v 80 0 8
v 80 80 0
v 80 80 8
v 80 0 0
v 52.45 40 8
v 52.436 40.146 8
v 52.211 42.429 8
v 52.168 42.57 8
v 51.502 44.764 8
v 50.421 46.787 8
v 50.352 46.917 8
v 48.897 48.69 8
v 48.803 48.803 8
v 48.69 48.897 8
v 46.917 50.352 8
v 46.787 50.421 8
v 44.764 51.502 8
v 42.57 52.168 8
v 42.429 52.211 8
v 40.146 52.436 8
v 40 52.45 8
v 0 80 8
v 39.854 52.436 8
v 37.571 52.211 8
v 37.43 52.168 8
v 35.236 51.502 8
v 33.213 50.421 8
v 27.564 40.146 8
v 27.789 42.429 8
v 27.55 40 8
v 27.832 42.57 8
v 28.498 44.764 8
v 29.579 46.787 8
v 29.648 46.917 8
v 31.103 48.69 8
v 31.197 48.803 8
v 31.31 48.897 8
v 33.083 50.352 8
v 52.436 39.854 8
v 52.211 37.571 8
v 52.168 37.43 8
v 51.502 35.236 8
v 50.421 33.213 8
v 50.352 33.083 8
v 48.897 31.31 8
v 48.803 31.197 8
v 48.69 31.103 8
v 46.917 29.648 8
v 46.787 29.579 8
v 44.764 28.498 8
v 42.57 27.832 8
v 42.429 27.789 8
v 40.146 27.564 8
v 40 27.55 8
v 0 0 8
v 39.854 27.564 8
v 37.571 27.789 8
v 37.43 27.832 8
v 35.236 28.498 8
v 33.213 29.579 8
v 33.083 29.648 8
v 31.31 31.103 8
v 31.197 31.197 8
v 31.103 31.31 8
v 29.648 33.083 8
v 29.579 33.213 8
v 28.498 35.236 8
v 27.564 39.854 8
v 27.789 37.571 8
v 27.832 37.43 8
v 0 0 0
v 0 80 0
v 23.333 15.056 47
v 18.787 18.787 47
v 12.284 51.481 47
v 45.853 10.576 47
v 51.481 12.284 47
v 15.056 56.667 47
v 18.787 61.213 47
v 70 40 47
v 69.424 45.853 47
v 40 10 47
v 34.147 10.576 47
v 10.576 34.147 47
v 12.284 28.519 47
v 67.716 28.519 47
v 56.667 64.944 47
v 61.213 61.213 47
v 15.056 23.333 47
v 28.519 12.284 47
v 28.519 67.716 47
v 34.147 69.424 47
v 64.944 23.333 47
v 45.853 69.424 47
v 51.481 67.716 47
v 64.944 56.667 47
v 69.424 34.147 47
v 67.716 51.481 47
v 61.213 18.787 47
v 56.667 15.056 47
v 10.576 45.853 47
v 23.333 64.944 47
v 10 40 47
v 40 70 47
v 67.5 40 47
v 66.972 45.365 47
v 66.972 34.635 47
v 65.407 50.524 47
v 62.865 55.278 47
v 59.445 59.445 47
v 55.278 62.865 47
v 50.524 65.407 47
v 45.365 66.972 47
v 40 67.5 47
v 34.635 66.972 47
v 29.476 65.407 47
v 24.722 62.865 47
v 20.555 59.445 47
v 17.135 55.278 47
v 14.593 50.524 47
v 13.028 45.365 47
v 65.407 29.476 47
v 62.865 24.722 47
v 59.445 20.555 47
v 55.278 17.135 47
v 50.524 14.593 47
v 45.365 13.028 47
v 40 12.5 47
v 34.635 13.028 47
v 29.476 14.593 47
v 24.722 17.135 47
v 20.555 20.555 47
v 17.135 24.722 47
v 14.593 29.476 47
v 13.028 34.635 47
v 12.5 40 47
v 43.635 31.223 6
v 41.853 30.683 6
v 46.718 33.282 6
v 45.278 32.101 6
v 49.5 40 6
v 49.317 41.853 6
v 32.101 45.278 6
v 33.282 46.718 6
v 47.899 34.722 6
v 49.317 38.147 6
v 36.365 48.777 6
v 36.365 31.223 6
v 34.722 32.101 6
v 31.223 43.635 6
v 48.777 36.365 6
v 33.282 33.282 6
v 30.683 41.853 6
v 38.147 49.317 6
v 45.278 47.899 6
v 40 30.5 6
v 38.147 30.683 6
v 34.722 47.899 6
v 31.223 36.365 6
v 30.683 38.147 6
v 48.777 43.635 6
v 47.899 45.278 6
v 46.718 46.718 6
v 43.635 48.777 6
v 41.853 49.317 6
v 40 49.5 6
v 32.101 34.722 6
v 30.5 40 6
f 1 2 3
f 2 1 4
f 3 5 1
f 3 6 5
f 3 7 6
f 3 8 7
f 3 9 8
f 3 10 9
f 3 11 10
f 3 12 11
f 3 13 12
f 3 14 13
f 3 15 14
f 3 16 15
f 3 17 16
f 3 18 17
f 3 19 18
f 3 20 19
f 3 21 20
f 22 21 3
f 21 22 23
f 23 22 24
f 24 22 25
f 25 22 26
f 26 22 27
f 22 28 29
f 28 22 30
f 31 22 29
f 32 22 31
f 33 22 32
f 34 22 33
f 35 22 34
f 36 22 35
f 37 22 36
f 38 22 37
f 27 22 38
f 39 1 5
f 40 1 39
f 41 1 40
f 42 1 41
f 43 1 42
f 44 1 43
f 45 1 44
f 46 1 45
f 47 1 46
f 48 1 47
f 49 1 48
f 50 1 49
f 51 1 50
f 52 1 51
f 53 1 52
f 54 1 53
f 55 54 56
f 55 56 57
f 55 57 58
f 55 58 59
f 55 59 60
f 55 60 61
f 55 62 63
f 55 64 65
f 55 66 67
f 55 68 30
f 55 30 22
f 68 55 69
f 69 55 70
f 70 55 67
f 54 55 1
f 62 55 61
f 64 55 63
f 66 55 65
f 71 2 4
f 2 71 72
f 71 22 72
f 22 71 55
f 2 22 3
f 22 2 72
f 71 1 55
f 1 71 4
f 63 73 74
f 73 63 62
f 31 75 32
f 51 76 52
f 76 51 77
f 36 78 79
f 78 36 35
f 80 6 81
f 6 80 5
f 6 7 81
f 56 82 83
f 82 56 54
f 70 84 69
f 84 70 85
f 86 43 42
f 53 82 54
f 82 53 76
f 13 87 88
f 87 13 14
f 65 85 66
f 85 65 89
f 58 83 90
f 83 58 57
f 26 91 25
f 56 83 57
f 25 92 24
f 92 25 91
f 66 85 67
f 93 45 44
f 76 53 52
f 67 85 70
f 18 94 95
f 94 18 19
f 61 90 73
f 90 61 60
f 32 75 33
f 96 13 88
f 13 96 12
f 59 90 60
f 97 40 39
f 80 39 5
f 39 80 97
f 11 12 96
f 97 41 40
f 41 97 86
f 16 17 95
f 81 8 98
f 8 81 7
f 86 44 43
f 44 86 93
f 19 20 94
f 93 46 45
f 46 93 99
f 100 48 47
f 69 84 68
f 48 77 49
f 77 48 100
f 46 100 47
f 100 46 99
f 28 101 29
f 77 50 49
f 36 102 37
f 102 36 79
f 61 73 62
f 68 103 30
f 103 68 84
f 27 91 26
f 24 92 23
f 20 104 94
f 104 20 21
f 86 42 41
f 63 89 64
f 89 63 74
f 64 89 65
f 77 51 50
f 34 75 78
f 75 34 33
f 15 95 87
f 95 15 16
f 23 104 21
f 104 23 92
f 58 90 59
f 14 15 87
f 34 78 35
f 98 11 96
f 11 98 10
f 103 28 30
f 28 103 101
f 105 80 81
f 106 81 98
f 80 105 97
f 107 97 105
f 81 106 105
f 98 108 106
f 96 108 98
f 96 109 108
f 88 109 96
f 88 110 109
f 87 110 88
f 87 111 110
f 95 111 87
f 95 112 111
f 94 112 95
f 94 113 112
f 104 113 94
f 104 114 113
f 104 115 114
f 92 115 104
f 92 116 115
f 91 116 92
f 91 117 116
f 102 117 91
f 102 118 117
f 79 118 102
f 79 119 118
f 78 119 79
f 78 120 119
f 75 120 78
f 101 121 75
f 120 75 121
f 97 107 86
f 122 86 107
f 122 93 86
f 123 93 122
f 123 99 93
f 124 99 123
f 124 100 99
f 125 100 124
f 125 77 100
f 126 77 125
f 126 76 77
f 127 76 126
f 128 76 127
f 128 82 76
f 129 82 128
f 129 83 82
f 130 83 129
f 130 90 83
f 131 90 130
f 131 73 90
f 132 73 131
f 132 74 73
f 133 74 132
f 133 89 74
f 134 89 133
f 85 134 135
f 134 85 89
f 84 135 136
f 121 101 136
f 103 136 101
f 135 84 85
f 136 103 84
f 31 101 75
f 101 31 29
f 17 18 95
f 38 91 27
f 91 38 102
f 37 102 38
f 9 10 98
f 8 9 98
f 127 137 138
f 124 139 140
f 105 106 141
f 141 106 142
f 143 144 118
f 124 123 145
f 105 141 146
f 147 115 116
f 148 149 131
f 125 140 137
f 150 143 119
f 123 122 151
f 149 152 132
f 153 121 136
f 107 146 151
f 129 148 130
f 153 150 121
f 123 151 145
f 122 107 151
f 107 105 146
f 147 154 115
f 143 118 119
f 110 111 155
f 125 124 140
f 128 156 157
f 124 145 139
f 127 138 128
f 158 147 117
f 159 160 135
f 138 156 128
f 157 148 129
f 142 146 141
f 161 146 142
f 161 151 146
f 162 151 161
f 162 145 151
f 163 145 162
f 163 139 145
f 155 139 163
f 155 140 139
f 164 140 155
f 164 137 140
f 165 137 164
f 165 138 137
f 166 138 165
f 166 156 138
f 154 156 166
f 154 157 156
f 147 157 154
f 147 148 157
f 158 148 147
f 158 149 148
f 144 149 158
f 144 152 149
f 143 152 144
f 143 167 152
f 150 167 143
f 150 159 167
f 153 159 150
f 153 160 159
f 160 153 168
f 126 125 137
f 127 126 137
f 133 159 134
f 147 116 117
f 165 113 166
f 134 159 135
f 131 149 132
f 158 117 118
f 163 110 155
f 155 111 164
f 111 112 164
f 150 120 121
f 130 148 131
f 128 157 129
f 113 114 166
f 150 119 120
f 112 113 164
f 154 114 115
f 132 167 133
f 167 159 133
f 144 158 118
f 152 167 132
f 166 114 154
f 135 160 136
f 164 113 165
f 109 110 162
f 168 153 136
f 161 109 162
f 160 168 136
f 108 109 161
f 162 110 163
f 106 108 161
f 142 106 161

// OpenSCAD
$fn = 32;

// ----------------------------------------------------------------------
// Hopper: funnel with square flange
// ----------------------------------------------------------------------

// --- parameters (mm) ---
fl = 80;                  // flange side, X and Y
fl_t = 8;                 // flange thickness
cone_h = 40;              // cone height above the flange
top_d = 60;               // cone mouth diameter
bot_d = 24;               // cone spout diameter
wall = 2.5;               // cone wall thickness

bore_d = bot_d - 2 * wall;  // spout bore diameter
total_h = fl_t + cone_h - 1;  // overall height

difference() {
  union() {
    cube([fl, fl, fl_t]);
    translate([fl / 2, fl / 2, fl_t - 1])
      cylinder(h = cone_h, d1 = bot_d, d2 = top_d);
  }
  translate([fl / 2, fl / 2, fl_t - 2])
    cylinder(h = cone_h + 1, d1 = bore_d, d2 = top_d - 2 * wall);
}
